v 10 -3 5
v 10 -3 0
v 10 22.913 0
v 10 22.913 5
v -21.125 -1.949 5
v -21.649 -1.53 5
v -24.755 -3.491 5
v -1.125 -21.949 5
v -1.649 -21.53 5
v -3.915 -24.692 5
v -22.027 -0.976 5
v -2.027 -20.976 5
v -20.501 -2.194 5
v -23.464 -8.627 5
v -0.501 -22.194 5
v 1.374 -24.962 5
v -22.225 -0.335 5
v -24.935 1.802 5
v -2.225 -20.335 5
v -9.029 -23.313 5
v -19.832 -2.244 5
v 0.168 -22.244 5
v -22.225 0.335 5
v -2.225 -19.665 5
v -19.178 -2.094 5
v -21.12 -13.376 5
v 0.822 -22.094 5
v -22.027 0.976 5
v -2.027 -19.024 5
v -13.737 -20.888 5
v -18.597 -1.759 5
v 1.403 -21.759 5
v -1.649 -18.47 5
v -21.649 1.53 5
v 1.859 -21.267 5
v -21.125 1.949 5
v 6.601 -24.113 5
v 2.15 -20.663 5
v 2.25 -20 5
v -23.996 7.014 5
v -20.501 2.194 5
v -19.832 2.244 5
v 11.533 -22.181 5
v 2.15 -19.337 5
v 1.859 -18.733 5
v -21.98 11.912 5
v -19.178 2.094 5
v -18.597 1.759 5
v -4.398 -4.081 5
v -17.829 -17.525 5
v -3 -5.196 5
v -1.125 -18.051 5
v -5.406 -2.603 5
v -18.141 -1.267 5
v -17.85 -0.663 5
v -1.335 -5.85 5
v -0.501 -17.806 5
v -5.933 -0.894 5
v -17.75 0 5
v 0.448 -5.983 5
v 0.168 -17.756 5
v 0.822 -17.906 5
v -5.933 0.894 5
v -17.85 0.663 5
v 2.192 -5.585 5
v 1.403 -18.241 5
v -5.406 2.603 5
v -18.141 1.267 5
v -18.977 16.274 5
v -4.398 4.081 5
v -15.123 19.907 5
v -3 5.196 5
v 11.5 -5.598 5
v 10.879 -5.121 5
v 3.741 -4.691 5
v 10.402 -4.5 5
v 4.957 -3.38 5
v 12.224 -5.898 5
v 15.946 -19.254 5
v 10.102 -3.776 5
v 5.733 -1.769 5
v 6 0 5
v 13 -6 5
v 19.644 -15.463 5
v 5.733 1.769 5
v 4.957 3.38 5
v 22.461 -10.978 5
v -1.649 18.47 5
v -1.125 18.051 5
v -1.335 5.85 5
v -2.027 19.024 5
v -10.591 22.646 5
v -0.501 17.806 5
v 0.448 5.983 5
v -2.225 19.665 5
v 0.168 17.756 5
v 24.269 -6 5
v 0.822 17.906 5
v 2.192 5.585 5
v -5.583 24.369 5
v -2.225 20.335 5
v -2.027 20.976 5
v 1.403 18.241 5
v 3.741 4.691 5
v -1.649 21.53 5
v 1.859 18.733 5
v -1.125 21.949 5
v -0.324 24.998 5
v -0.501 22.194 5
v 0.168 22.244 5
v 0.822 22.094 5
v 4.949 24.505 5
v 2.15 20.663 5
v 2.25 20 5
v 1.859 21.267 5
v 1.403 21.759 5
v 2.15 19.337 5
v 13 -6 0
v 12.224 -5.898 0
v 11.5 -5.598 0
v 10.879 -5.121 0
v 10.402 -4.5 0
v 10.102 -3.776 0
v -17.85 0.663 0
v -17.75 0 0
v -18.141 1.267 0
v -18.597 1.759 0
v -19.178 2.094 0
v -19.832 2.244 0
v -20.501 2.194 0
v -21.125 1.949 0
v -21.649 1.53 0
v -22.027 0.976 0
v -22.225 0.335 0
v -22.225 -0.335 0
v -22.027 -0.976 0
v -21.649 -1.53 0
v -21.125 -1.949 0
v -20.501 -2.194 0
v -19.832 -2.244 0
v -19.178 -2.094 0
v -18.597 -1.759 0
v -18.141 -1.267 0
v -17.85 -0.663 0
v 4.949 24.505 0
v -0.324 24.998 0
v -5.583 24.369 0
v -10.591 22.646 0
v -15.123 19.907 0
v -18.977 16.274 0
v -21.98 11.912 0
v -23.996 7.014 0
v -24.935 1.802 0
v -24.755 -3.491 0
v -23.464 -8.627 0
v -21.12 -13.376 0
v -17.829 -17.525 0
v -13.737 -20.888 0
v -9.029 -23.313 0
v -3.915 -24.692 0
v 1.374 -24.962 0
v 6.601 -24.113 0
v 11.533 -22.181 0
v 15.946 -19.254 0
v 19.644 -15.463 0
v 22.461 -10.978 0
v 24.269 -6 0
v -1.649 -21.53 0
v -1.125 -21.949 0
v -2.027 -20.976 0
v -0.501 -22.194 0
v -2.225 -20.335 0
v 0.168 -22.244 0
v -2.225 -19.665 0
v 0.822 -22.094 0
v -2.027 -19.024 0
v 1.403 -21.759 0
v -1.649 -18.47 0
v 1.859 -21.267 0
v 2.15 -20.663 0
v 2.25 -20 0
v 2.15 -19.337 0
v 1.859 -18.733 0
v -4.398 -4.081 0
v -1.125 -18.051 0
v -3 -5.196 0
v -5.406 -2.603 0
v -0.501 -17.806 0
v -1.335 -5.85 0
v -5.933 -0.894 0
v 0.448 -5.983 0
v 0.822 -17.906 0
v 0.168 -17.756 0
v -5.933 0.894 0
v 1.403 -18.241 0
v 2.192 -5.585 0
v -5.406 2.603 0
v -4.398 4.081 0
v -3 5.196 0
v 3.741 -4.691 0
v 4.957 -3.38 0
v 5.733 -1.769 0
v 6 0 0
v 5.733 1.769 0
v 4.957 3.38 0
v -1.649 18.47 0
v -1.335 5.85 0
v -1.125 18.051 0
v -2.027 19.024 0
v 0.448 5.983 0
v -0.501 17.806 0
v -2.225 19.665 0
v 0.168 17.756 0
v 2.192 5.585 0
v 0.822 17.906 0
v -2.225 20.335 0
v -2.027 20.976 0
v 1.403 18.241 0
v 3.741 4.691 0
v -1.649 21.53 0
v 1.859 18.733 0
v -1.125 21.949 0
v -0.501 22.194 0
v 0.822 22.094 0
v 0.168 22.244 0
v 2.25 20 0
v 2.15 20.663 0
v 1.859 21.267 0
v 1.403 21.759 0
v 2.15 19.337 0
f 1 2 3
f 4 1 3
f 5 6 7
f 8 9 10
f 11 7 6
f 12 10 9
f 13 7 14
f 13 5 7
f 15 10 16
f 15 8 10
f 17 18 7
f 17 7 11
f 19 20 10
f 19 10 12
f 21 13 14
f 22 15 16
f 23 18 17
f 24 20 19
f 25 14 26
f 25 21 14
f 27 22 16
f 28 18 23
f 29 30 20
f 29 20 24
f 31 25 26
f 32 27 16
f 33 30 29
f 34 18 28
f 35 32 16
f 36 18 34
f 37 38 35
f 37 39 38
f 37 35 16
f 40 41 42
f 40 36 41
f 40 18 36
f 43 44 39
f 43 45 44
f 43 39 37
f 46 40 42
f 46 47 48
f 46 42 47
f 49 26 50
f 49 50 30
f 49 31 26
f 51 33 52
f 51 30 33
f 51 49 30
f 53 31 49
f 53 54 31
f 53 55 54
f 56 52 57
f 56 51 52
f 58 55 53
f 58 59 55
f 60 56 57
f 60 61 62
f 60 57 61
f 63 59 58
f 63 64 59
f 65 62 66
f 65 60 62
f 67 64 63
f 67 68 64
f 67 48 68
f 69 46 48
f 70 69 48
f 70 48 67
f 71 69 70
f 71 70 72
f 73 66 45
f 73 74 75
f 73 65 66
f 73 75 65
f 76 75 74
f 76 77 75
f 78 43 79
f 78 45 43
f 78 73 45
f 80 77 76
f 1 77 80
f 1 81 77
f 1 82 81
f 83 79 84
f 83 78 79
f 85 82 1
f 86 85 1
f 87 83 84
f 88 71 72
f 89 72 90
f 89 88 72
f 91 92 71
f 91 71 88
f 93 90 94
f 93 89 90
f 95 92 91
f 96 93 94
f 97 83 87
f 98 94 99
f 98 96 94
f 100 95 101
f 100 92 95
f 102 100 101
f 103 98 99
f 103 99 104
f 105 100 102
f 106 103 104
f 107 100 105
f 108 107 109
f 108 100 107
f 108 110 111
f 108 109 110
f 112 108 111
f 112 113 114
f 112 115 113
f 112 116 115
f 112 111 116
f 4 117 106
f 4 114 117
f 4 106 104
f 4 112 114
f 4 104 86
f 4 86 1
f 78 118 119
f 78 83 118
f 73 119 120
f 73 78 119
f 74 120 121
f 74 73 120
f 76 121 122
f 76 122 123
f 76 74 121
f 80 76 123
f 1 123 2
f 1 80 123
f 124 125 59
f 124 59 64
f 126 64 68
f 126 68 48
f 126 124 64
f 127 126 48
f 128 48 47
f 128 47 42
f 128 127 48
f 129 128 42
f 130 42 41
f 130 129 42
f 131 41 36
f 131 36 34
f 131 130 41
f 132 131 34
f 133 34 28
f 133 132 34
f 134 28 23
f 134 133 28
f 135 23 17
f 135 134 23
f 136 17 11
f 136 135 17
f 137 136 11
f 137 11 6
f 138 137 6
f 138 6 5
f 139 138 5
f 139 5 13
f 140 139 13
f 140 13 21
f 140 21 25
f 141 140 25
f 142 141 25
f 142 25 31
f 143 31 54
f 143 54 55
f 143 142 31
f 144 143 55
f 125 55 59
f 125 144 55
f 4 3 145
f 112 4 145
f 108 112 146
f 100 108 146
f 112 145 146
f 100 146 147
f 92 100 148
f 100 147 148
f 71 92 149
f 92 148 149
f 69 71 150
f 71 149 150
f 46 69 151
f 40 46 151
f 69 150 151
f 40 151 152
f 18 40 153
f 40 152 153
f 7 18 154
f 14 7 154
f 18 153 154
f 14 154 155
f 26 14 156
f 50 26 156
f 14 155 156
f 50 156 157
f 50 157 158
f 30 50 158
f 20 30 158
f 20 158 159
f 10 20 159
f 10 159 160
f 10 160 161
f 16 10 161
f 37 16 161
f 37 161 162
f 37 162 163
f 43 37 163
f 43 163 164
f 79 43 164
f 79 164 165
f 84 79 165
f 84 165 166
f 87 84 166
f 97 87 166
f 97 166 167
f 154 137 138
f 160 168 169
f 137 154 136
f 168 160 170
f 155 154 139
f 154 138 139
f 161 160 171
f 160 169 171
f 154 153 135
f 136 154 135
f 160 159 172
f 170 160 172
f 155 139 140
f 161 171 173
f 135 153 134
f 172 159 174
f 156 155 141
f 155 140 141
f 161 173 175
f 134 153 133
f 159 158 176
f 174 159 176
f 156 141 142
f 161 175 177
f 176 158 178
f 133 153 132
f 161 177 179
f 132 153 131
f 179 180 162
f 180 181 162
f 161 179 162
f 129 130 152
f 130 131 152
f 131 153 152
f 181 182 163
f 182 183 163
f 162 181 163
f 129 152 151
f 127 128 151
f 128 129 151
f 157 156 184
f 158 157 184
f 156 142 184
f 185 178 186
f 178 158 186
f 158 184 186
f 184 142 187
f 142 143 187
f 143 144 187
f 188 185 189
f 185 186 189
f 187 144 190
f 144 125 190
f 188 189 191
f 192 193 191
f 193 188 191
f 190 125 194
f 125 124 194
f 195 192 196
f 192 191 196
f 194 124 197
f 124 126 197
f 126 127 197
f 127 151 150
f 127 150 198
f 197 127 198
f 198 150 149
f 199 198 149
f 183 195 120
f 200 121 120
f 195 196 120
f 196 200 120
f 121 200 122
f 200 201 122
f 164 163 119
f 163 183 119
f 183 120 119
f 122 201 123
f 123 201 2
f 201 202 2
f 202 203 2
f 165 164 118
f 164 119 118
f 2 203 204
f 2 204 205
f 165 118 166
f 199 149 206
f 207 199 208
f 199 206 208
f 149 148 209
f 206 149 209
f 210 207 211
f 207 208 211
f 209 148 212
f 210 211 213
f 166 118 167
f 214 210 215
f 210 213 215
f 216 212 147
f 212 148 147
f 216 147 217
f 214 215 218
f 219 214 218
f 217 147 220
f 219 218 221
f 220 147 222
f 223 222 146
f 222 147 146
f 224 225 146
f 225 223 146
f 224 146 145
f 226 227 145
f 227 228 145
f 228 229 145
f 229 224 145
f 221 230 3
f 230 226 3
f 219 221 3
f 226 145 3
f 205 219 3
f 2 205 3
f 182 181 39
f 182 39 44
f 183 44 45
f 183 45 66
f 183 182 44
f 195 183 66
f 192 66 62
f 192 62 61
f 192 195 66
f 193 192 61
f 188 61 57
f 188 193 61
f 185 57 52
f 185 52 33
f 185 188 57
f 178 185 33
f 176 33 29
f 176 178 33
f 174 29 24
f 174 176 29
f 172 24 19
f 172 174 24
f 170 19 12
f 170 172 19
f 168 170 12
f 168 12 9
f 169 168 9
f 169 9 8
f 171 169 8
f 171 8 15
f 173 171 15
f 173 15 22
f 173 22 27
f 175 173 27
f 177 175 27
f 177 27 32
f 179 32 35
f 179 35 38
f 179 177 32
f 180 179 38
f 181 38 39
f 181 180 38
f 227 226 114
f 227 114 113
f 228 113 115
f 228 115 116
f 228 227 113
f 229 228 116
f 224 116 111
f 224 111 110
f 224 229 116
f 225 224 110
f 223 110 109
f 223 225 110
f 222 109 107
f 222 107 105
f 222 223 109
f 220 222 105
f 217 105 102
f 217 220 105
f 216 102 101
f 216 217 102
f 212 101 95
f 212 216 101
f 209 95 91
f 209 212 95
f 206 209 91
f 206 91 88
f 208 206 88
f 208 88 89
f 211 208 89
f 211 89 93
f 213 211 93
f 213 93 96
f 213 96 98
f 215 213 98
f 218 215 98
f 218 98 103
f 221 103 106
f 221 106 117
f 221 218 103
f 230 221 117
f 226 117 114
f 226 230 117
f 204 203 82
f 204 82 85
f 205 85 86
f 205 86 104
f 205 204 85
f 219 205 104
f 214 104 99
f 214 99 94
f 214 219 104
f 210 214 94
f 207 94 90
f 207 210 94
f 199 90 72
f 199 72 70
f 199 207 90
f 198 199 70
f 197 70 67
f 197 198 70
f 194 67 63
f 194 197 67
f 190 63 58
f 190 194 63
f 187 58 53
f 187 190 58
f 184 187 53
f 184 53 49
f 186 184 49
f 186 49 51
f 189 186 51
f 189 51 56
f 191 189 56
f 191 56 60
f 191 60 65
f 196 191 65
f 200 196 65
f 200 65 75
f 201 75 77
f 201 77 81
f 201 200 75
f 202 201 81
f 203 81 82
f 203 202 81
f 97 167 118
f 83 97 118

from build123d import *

# Parameters (mm, degrees)
SKIZZE1_R                       = 25
SKIZZE1_R_2                     = 6
SKIZZE1_R_3                     = 2.25
AUFSATZ_LINEAR_AUSTRAGEN1_DEPTH = 5
SKIZZE2_W                       = 24.326966906
SKIZZE2_H                       = 39.351197917
SCHNITT_LINEAR_AUSTRAGEN1_DEPTH = 5
VERRUNDUNG1_R                   = 3


with BuildPart() as part:
    # Skizze1 → Aufsatz-Linear austragen1 (new body)
    with BuildSketch(Plane.XY):
        Circle(SKIZZE1_R)
        Circle(SKIZZE1_R_2, mode=Mode.SUBTRACT)
        with Locations((0, 20)):
            Circle(SKIZZE1_R_3, mode=Mode.SUBTRACT)
        with Locations((-20, 0)):
            Circle(SKIZZE1_R_3, mode=Mode.SUBTRACT)
        with Locations((0, -20)):
            Circle(SKIZZE1_R_3, mode=Mode.SUBTRACT)
    extrude(amount=AUFSATZ_LINEAR_AUSTRAGEN1_DEPTH)

    # Skizze2 → Schnitt-Linear austragen1 (cut)
    with BuildSketch(Plane(origin=(0, 0, 0), x_dir=(-1, 0, 0), z_dir=(0, 0, -1))):
        with Locations((-22.163483453, 13.675598959)):
            Rectangle(SKIZZE2_W, SKIZZE2_H)
    extrude(amount=-SCHNITT_LINEAR_AUSTRAGEN1_DEPTH, mode=Mode.SUBTRACT)

    # Verrundung1
    verrundung1_edges = [part.edges().sort_by_distance(p)[0] for p in [
        (10, -6, 2.5),
    ]]
    fillet(verrundung1_edges, radius=VERRUNDUNG1_R)


solid = part.part
